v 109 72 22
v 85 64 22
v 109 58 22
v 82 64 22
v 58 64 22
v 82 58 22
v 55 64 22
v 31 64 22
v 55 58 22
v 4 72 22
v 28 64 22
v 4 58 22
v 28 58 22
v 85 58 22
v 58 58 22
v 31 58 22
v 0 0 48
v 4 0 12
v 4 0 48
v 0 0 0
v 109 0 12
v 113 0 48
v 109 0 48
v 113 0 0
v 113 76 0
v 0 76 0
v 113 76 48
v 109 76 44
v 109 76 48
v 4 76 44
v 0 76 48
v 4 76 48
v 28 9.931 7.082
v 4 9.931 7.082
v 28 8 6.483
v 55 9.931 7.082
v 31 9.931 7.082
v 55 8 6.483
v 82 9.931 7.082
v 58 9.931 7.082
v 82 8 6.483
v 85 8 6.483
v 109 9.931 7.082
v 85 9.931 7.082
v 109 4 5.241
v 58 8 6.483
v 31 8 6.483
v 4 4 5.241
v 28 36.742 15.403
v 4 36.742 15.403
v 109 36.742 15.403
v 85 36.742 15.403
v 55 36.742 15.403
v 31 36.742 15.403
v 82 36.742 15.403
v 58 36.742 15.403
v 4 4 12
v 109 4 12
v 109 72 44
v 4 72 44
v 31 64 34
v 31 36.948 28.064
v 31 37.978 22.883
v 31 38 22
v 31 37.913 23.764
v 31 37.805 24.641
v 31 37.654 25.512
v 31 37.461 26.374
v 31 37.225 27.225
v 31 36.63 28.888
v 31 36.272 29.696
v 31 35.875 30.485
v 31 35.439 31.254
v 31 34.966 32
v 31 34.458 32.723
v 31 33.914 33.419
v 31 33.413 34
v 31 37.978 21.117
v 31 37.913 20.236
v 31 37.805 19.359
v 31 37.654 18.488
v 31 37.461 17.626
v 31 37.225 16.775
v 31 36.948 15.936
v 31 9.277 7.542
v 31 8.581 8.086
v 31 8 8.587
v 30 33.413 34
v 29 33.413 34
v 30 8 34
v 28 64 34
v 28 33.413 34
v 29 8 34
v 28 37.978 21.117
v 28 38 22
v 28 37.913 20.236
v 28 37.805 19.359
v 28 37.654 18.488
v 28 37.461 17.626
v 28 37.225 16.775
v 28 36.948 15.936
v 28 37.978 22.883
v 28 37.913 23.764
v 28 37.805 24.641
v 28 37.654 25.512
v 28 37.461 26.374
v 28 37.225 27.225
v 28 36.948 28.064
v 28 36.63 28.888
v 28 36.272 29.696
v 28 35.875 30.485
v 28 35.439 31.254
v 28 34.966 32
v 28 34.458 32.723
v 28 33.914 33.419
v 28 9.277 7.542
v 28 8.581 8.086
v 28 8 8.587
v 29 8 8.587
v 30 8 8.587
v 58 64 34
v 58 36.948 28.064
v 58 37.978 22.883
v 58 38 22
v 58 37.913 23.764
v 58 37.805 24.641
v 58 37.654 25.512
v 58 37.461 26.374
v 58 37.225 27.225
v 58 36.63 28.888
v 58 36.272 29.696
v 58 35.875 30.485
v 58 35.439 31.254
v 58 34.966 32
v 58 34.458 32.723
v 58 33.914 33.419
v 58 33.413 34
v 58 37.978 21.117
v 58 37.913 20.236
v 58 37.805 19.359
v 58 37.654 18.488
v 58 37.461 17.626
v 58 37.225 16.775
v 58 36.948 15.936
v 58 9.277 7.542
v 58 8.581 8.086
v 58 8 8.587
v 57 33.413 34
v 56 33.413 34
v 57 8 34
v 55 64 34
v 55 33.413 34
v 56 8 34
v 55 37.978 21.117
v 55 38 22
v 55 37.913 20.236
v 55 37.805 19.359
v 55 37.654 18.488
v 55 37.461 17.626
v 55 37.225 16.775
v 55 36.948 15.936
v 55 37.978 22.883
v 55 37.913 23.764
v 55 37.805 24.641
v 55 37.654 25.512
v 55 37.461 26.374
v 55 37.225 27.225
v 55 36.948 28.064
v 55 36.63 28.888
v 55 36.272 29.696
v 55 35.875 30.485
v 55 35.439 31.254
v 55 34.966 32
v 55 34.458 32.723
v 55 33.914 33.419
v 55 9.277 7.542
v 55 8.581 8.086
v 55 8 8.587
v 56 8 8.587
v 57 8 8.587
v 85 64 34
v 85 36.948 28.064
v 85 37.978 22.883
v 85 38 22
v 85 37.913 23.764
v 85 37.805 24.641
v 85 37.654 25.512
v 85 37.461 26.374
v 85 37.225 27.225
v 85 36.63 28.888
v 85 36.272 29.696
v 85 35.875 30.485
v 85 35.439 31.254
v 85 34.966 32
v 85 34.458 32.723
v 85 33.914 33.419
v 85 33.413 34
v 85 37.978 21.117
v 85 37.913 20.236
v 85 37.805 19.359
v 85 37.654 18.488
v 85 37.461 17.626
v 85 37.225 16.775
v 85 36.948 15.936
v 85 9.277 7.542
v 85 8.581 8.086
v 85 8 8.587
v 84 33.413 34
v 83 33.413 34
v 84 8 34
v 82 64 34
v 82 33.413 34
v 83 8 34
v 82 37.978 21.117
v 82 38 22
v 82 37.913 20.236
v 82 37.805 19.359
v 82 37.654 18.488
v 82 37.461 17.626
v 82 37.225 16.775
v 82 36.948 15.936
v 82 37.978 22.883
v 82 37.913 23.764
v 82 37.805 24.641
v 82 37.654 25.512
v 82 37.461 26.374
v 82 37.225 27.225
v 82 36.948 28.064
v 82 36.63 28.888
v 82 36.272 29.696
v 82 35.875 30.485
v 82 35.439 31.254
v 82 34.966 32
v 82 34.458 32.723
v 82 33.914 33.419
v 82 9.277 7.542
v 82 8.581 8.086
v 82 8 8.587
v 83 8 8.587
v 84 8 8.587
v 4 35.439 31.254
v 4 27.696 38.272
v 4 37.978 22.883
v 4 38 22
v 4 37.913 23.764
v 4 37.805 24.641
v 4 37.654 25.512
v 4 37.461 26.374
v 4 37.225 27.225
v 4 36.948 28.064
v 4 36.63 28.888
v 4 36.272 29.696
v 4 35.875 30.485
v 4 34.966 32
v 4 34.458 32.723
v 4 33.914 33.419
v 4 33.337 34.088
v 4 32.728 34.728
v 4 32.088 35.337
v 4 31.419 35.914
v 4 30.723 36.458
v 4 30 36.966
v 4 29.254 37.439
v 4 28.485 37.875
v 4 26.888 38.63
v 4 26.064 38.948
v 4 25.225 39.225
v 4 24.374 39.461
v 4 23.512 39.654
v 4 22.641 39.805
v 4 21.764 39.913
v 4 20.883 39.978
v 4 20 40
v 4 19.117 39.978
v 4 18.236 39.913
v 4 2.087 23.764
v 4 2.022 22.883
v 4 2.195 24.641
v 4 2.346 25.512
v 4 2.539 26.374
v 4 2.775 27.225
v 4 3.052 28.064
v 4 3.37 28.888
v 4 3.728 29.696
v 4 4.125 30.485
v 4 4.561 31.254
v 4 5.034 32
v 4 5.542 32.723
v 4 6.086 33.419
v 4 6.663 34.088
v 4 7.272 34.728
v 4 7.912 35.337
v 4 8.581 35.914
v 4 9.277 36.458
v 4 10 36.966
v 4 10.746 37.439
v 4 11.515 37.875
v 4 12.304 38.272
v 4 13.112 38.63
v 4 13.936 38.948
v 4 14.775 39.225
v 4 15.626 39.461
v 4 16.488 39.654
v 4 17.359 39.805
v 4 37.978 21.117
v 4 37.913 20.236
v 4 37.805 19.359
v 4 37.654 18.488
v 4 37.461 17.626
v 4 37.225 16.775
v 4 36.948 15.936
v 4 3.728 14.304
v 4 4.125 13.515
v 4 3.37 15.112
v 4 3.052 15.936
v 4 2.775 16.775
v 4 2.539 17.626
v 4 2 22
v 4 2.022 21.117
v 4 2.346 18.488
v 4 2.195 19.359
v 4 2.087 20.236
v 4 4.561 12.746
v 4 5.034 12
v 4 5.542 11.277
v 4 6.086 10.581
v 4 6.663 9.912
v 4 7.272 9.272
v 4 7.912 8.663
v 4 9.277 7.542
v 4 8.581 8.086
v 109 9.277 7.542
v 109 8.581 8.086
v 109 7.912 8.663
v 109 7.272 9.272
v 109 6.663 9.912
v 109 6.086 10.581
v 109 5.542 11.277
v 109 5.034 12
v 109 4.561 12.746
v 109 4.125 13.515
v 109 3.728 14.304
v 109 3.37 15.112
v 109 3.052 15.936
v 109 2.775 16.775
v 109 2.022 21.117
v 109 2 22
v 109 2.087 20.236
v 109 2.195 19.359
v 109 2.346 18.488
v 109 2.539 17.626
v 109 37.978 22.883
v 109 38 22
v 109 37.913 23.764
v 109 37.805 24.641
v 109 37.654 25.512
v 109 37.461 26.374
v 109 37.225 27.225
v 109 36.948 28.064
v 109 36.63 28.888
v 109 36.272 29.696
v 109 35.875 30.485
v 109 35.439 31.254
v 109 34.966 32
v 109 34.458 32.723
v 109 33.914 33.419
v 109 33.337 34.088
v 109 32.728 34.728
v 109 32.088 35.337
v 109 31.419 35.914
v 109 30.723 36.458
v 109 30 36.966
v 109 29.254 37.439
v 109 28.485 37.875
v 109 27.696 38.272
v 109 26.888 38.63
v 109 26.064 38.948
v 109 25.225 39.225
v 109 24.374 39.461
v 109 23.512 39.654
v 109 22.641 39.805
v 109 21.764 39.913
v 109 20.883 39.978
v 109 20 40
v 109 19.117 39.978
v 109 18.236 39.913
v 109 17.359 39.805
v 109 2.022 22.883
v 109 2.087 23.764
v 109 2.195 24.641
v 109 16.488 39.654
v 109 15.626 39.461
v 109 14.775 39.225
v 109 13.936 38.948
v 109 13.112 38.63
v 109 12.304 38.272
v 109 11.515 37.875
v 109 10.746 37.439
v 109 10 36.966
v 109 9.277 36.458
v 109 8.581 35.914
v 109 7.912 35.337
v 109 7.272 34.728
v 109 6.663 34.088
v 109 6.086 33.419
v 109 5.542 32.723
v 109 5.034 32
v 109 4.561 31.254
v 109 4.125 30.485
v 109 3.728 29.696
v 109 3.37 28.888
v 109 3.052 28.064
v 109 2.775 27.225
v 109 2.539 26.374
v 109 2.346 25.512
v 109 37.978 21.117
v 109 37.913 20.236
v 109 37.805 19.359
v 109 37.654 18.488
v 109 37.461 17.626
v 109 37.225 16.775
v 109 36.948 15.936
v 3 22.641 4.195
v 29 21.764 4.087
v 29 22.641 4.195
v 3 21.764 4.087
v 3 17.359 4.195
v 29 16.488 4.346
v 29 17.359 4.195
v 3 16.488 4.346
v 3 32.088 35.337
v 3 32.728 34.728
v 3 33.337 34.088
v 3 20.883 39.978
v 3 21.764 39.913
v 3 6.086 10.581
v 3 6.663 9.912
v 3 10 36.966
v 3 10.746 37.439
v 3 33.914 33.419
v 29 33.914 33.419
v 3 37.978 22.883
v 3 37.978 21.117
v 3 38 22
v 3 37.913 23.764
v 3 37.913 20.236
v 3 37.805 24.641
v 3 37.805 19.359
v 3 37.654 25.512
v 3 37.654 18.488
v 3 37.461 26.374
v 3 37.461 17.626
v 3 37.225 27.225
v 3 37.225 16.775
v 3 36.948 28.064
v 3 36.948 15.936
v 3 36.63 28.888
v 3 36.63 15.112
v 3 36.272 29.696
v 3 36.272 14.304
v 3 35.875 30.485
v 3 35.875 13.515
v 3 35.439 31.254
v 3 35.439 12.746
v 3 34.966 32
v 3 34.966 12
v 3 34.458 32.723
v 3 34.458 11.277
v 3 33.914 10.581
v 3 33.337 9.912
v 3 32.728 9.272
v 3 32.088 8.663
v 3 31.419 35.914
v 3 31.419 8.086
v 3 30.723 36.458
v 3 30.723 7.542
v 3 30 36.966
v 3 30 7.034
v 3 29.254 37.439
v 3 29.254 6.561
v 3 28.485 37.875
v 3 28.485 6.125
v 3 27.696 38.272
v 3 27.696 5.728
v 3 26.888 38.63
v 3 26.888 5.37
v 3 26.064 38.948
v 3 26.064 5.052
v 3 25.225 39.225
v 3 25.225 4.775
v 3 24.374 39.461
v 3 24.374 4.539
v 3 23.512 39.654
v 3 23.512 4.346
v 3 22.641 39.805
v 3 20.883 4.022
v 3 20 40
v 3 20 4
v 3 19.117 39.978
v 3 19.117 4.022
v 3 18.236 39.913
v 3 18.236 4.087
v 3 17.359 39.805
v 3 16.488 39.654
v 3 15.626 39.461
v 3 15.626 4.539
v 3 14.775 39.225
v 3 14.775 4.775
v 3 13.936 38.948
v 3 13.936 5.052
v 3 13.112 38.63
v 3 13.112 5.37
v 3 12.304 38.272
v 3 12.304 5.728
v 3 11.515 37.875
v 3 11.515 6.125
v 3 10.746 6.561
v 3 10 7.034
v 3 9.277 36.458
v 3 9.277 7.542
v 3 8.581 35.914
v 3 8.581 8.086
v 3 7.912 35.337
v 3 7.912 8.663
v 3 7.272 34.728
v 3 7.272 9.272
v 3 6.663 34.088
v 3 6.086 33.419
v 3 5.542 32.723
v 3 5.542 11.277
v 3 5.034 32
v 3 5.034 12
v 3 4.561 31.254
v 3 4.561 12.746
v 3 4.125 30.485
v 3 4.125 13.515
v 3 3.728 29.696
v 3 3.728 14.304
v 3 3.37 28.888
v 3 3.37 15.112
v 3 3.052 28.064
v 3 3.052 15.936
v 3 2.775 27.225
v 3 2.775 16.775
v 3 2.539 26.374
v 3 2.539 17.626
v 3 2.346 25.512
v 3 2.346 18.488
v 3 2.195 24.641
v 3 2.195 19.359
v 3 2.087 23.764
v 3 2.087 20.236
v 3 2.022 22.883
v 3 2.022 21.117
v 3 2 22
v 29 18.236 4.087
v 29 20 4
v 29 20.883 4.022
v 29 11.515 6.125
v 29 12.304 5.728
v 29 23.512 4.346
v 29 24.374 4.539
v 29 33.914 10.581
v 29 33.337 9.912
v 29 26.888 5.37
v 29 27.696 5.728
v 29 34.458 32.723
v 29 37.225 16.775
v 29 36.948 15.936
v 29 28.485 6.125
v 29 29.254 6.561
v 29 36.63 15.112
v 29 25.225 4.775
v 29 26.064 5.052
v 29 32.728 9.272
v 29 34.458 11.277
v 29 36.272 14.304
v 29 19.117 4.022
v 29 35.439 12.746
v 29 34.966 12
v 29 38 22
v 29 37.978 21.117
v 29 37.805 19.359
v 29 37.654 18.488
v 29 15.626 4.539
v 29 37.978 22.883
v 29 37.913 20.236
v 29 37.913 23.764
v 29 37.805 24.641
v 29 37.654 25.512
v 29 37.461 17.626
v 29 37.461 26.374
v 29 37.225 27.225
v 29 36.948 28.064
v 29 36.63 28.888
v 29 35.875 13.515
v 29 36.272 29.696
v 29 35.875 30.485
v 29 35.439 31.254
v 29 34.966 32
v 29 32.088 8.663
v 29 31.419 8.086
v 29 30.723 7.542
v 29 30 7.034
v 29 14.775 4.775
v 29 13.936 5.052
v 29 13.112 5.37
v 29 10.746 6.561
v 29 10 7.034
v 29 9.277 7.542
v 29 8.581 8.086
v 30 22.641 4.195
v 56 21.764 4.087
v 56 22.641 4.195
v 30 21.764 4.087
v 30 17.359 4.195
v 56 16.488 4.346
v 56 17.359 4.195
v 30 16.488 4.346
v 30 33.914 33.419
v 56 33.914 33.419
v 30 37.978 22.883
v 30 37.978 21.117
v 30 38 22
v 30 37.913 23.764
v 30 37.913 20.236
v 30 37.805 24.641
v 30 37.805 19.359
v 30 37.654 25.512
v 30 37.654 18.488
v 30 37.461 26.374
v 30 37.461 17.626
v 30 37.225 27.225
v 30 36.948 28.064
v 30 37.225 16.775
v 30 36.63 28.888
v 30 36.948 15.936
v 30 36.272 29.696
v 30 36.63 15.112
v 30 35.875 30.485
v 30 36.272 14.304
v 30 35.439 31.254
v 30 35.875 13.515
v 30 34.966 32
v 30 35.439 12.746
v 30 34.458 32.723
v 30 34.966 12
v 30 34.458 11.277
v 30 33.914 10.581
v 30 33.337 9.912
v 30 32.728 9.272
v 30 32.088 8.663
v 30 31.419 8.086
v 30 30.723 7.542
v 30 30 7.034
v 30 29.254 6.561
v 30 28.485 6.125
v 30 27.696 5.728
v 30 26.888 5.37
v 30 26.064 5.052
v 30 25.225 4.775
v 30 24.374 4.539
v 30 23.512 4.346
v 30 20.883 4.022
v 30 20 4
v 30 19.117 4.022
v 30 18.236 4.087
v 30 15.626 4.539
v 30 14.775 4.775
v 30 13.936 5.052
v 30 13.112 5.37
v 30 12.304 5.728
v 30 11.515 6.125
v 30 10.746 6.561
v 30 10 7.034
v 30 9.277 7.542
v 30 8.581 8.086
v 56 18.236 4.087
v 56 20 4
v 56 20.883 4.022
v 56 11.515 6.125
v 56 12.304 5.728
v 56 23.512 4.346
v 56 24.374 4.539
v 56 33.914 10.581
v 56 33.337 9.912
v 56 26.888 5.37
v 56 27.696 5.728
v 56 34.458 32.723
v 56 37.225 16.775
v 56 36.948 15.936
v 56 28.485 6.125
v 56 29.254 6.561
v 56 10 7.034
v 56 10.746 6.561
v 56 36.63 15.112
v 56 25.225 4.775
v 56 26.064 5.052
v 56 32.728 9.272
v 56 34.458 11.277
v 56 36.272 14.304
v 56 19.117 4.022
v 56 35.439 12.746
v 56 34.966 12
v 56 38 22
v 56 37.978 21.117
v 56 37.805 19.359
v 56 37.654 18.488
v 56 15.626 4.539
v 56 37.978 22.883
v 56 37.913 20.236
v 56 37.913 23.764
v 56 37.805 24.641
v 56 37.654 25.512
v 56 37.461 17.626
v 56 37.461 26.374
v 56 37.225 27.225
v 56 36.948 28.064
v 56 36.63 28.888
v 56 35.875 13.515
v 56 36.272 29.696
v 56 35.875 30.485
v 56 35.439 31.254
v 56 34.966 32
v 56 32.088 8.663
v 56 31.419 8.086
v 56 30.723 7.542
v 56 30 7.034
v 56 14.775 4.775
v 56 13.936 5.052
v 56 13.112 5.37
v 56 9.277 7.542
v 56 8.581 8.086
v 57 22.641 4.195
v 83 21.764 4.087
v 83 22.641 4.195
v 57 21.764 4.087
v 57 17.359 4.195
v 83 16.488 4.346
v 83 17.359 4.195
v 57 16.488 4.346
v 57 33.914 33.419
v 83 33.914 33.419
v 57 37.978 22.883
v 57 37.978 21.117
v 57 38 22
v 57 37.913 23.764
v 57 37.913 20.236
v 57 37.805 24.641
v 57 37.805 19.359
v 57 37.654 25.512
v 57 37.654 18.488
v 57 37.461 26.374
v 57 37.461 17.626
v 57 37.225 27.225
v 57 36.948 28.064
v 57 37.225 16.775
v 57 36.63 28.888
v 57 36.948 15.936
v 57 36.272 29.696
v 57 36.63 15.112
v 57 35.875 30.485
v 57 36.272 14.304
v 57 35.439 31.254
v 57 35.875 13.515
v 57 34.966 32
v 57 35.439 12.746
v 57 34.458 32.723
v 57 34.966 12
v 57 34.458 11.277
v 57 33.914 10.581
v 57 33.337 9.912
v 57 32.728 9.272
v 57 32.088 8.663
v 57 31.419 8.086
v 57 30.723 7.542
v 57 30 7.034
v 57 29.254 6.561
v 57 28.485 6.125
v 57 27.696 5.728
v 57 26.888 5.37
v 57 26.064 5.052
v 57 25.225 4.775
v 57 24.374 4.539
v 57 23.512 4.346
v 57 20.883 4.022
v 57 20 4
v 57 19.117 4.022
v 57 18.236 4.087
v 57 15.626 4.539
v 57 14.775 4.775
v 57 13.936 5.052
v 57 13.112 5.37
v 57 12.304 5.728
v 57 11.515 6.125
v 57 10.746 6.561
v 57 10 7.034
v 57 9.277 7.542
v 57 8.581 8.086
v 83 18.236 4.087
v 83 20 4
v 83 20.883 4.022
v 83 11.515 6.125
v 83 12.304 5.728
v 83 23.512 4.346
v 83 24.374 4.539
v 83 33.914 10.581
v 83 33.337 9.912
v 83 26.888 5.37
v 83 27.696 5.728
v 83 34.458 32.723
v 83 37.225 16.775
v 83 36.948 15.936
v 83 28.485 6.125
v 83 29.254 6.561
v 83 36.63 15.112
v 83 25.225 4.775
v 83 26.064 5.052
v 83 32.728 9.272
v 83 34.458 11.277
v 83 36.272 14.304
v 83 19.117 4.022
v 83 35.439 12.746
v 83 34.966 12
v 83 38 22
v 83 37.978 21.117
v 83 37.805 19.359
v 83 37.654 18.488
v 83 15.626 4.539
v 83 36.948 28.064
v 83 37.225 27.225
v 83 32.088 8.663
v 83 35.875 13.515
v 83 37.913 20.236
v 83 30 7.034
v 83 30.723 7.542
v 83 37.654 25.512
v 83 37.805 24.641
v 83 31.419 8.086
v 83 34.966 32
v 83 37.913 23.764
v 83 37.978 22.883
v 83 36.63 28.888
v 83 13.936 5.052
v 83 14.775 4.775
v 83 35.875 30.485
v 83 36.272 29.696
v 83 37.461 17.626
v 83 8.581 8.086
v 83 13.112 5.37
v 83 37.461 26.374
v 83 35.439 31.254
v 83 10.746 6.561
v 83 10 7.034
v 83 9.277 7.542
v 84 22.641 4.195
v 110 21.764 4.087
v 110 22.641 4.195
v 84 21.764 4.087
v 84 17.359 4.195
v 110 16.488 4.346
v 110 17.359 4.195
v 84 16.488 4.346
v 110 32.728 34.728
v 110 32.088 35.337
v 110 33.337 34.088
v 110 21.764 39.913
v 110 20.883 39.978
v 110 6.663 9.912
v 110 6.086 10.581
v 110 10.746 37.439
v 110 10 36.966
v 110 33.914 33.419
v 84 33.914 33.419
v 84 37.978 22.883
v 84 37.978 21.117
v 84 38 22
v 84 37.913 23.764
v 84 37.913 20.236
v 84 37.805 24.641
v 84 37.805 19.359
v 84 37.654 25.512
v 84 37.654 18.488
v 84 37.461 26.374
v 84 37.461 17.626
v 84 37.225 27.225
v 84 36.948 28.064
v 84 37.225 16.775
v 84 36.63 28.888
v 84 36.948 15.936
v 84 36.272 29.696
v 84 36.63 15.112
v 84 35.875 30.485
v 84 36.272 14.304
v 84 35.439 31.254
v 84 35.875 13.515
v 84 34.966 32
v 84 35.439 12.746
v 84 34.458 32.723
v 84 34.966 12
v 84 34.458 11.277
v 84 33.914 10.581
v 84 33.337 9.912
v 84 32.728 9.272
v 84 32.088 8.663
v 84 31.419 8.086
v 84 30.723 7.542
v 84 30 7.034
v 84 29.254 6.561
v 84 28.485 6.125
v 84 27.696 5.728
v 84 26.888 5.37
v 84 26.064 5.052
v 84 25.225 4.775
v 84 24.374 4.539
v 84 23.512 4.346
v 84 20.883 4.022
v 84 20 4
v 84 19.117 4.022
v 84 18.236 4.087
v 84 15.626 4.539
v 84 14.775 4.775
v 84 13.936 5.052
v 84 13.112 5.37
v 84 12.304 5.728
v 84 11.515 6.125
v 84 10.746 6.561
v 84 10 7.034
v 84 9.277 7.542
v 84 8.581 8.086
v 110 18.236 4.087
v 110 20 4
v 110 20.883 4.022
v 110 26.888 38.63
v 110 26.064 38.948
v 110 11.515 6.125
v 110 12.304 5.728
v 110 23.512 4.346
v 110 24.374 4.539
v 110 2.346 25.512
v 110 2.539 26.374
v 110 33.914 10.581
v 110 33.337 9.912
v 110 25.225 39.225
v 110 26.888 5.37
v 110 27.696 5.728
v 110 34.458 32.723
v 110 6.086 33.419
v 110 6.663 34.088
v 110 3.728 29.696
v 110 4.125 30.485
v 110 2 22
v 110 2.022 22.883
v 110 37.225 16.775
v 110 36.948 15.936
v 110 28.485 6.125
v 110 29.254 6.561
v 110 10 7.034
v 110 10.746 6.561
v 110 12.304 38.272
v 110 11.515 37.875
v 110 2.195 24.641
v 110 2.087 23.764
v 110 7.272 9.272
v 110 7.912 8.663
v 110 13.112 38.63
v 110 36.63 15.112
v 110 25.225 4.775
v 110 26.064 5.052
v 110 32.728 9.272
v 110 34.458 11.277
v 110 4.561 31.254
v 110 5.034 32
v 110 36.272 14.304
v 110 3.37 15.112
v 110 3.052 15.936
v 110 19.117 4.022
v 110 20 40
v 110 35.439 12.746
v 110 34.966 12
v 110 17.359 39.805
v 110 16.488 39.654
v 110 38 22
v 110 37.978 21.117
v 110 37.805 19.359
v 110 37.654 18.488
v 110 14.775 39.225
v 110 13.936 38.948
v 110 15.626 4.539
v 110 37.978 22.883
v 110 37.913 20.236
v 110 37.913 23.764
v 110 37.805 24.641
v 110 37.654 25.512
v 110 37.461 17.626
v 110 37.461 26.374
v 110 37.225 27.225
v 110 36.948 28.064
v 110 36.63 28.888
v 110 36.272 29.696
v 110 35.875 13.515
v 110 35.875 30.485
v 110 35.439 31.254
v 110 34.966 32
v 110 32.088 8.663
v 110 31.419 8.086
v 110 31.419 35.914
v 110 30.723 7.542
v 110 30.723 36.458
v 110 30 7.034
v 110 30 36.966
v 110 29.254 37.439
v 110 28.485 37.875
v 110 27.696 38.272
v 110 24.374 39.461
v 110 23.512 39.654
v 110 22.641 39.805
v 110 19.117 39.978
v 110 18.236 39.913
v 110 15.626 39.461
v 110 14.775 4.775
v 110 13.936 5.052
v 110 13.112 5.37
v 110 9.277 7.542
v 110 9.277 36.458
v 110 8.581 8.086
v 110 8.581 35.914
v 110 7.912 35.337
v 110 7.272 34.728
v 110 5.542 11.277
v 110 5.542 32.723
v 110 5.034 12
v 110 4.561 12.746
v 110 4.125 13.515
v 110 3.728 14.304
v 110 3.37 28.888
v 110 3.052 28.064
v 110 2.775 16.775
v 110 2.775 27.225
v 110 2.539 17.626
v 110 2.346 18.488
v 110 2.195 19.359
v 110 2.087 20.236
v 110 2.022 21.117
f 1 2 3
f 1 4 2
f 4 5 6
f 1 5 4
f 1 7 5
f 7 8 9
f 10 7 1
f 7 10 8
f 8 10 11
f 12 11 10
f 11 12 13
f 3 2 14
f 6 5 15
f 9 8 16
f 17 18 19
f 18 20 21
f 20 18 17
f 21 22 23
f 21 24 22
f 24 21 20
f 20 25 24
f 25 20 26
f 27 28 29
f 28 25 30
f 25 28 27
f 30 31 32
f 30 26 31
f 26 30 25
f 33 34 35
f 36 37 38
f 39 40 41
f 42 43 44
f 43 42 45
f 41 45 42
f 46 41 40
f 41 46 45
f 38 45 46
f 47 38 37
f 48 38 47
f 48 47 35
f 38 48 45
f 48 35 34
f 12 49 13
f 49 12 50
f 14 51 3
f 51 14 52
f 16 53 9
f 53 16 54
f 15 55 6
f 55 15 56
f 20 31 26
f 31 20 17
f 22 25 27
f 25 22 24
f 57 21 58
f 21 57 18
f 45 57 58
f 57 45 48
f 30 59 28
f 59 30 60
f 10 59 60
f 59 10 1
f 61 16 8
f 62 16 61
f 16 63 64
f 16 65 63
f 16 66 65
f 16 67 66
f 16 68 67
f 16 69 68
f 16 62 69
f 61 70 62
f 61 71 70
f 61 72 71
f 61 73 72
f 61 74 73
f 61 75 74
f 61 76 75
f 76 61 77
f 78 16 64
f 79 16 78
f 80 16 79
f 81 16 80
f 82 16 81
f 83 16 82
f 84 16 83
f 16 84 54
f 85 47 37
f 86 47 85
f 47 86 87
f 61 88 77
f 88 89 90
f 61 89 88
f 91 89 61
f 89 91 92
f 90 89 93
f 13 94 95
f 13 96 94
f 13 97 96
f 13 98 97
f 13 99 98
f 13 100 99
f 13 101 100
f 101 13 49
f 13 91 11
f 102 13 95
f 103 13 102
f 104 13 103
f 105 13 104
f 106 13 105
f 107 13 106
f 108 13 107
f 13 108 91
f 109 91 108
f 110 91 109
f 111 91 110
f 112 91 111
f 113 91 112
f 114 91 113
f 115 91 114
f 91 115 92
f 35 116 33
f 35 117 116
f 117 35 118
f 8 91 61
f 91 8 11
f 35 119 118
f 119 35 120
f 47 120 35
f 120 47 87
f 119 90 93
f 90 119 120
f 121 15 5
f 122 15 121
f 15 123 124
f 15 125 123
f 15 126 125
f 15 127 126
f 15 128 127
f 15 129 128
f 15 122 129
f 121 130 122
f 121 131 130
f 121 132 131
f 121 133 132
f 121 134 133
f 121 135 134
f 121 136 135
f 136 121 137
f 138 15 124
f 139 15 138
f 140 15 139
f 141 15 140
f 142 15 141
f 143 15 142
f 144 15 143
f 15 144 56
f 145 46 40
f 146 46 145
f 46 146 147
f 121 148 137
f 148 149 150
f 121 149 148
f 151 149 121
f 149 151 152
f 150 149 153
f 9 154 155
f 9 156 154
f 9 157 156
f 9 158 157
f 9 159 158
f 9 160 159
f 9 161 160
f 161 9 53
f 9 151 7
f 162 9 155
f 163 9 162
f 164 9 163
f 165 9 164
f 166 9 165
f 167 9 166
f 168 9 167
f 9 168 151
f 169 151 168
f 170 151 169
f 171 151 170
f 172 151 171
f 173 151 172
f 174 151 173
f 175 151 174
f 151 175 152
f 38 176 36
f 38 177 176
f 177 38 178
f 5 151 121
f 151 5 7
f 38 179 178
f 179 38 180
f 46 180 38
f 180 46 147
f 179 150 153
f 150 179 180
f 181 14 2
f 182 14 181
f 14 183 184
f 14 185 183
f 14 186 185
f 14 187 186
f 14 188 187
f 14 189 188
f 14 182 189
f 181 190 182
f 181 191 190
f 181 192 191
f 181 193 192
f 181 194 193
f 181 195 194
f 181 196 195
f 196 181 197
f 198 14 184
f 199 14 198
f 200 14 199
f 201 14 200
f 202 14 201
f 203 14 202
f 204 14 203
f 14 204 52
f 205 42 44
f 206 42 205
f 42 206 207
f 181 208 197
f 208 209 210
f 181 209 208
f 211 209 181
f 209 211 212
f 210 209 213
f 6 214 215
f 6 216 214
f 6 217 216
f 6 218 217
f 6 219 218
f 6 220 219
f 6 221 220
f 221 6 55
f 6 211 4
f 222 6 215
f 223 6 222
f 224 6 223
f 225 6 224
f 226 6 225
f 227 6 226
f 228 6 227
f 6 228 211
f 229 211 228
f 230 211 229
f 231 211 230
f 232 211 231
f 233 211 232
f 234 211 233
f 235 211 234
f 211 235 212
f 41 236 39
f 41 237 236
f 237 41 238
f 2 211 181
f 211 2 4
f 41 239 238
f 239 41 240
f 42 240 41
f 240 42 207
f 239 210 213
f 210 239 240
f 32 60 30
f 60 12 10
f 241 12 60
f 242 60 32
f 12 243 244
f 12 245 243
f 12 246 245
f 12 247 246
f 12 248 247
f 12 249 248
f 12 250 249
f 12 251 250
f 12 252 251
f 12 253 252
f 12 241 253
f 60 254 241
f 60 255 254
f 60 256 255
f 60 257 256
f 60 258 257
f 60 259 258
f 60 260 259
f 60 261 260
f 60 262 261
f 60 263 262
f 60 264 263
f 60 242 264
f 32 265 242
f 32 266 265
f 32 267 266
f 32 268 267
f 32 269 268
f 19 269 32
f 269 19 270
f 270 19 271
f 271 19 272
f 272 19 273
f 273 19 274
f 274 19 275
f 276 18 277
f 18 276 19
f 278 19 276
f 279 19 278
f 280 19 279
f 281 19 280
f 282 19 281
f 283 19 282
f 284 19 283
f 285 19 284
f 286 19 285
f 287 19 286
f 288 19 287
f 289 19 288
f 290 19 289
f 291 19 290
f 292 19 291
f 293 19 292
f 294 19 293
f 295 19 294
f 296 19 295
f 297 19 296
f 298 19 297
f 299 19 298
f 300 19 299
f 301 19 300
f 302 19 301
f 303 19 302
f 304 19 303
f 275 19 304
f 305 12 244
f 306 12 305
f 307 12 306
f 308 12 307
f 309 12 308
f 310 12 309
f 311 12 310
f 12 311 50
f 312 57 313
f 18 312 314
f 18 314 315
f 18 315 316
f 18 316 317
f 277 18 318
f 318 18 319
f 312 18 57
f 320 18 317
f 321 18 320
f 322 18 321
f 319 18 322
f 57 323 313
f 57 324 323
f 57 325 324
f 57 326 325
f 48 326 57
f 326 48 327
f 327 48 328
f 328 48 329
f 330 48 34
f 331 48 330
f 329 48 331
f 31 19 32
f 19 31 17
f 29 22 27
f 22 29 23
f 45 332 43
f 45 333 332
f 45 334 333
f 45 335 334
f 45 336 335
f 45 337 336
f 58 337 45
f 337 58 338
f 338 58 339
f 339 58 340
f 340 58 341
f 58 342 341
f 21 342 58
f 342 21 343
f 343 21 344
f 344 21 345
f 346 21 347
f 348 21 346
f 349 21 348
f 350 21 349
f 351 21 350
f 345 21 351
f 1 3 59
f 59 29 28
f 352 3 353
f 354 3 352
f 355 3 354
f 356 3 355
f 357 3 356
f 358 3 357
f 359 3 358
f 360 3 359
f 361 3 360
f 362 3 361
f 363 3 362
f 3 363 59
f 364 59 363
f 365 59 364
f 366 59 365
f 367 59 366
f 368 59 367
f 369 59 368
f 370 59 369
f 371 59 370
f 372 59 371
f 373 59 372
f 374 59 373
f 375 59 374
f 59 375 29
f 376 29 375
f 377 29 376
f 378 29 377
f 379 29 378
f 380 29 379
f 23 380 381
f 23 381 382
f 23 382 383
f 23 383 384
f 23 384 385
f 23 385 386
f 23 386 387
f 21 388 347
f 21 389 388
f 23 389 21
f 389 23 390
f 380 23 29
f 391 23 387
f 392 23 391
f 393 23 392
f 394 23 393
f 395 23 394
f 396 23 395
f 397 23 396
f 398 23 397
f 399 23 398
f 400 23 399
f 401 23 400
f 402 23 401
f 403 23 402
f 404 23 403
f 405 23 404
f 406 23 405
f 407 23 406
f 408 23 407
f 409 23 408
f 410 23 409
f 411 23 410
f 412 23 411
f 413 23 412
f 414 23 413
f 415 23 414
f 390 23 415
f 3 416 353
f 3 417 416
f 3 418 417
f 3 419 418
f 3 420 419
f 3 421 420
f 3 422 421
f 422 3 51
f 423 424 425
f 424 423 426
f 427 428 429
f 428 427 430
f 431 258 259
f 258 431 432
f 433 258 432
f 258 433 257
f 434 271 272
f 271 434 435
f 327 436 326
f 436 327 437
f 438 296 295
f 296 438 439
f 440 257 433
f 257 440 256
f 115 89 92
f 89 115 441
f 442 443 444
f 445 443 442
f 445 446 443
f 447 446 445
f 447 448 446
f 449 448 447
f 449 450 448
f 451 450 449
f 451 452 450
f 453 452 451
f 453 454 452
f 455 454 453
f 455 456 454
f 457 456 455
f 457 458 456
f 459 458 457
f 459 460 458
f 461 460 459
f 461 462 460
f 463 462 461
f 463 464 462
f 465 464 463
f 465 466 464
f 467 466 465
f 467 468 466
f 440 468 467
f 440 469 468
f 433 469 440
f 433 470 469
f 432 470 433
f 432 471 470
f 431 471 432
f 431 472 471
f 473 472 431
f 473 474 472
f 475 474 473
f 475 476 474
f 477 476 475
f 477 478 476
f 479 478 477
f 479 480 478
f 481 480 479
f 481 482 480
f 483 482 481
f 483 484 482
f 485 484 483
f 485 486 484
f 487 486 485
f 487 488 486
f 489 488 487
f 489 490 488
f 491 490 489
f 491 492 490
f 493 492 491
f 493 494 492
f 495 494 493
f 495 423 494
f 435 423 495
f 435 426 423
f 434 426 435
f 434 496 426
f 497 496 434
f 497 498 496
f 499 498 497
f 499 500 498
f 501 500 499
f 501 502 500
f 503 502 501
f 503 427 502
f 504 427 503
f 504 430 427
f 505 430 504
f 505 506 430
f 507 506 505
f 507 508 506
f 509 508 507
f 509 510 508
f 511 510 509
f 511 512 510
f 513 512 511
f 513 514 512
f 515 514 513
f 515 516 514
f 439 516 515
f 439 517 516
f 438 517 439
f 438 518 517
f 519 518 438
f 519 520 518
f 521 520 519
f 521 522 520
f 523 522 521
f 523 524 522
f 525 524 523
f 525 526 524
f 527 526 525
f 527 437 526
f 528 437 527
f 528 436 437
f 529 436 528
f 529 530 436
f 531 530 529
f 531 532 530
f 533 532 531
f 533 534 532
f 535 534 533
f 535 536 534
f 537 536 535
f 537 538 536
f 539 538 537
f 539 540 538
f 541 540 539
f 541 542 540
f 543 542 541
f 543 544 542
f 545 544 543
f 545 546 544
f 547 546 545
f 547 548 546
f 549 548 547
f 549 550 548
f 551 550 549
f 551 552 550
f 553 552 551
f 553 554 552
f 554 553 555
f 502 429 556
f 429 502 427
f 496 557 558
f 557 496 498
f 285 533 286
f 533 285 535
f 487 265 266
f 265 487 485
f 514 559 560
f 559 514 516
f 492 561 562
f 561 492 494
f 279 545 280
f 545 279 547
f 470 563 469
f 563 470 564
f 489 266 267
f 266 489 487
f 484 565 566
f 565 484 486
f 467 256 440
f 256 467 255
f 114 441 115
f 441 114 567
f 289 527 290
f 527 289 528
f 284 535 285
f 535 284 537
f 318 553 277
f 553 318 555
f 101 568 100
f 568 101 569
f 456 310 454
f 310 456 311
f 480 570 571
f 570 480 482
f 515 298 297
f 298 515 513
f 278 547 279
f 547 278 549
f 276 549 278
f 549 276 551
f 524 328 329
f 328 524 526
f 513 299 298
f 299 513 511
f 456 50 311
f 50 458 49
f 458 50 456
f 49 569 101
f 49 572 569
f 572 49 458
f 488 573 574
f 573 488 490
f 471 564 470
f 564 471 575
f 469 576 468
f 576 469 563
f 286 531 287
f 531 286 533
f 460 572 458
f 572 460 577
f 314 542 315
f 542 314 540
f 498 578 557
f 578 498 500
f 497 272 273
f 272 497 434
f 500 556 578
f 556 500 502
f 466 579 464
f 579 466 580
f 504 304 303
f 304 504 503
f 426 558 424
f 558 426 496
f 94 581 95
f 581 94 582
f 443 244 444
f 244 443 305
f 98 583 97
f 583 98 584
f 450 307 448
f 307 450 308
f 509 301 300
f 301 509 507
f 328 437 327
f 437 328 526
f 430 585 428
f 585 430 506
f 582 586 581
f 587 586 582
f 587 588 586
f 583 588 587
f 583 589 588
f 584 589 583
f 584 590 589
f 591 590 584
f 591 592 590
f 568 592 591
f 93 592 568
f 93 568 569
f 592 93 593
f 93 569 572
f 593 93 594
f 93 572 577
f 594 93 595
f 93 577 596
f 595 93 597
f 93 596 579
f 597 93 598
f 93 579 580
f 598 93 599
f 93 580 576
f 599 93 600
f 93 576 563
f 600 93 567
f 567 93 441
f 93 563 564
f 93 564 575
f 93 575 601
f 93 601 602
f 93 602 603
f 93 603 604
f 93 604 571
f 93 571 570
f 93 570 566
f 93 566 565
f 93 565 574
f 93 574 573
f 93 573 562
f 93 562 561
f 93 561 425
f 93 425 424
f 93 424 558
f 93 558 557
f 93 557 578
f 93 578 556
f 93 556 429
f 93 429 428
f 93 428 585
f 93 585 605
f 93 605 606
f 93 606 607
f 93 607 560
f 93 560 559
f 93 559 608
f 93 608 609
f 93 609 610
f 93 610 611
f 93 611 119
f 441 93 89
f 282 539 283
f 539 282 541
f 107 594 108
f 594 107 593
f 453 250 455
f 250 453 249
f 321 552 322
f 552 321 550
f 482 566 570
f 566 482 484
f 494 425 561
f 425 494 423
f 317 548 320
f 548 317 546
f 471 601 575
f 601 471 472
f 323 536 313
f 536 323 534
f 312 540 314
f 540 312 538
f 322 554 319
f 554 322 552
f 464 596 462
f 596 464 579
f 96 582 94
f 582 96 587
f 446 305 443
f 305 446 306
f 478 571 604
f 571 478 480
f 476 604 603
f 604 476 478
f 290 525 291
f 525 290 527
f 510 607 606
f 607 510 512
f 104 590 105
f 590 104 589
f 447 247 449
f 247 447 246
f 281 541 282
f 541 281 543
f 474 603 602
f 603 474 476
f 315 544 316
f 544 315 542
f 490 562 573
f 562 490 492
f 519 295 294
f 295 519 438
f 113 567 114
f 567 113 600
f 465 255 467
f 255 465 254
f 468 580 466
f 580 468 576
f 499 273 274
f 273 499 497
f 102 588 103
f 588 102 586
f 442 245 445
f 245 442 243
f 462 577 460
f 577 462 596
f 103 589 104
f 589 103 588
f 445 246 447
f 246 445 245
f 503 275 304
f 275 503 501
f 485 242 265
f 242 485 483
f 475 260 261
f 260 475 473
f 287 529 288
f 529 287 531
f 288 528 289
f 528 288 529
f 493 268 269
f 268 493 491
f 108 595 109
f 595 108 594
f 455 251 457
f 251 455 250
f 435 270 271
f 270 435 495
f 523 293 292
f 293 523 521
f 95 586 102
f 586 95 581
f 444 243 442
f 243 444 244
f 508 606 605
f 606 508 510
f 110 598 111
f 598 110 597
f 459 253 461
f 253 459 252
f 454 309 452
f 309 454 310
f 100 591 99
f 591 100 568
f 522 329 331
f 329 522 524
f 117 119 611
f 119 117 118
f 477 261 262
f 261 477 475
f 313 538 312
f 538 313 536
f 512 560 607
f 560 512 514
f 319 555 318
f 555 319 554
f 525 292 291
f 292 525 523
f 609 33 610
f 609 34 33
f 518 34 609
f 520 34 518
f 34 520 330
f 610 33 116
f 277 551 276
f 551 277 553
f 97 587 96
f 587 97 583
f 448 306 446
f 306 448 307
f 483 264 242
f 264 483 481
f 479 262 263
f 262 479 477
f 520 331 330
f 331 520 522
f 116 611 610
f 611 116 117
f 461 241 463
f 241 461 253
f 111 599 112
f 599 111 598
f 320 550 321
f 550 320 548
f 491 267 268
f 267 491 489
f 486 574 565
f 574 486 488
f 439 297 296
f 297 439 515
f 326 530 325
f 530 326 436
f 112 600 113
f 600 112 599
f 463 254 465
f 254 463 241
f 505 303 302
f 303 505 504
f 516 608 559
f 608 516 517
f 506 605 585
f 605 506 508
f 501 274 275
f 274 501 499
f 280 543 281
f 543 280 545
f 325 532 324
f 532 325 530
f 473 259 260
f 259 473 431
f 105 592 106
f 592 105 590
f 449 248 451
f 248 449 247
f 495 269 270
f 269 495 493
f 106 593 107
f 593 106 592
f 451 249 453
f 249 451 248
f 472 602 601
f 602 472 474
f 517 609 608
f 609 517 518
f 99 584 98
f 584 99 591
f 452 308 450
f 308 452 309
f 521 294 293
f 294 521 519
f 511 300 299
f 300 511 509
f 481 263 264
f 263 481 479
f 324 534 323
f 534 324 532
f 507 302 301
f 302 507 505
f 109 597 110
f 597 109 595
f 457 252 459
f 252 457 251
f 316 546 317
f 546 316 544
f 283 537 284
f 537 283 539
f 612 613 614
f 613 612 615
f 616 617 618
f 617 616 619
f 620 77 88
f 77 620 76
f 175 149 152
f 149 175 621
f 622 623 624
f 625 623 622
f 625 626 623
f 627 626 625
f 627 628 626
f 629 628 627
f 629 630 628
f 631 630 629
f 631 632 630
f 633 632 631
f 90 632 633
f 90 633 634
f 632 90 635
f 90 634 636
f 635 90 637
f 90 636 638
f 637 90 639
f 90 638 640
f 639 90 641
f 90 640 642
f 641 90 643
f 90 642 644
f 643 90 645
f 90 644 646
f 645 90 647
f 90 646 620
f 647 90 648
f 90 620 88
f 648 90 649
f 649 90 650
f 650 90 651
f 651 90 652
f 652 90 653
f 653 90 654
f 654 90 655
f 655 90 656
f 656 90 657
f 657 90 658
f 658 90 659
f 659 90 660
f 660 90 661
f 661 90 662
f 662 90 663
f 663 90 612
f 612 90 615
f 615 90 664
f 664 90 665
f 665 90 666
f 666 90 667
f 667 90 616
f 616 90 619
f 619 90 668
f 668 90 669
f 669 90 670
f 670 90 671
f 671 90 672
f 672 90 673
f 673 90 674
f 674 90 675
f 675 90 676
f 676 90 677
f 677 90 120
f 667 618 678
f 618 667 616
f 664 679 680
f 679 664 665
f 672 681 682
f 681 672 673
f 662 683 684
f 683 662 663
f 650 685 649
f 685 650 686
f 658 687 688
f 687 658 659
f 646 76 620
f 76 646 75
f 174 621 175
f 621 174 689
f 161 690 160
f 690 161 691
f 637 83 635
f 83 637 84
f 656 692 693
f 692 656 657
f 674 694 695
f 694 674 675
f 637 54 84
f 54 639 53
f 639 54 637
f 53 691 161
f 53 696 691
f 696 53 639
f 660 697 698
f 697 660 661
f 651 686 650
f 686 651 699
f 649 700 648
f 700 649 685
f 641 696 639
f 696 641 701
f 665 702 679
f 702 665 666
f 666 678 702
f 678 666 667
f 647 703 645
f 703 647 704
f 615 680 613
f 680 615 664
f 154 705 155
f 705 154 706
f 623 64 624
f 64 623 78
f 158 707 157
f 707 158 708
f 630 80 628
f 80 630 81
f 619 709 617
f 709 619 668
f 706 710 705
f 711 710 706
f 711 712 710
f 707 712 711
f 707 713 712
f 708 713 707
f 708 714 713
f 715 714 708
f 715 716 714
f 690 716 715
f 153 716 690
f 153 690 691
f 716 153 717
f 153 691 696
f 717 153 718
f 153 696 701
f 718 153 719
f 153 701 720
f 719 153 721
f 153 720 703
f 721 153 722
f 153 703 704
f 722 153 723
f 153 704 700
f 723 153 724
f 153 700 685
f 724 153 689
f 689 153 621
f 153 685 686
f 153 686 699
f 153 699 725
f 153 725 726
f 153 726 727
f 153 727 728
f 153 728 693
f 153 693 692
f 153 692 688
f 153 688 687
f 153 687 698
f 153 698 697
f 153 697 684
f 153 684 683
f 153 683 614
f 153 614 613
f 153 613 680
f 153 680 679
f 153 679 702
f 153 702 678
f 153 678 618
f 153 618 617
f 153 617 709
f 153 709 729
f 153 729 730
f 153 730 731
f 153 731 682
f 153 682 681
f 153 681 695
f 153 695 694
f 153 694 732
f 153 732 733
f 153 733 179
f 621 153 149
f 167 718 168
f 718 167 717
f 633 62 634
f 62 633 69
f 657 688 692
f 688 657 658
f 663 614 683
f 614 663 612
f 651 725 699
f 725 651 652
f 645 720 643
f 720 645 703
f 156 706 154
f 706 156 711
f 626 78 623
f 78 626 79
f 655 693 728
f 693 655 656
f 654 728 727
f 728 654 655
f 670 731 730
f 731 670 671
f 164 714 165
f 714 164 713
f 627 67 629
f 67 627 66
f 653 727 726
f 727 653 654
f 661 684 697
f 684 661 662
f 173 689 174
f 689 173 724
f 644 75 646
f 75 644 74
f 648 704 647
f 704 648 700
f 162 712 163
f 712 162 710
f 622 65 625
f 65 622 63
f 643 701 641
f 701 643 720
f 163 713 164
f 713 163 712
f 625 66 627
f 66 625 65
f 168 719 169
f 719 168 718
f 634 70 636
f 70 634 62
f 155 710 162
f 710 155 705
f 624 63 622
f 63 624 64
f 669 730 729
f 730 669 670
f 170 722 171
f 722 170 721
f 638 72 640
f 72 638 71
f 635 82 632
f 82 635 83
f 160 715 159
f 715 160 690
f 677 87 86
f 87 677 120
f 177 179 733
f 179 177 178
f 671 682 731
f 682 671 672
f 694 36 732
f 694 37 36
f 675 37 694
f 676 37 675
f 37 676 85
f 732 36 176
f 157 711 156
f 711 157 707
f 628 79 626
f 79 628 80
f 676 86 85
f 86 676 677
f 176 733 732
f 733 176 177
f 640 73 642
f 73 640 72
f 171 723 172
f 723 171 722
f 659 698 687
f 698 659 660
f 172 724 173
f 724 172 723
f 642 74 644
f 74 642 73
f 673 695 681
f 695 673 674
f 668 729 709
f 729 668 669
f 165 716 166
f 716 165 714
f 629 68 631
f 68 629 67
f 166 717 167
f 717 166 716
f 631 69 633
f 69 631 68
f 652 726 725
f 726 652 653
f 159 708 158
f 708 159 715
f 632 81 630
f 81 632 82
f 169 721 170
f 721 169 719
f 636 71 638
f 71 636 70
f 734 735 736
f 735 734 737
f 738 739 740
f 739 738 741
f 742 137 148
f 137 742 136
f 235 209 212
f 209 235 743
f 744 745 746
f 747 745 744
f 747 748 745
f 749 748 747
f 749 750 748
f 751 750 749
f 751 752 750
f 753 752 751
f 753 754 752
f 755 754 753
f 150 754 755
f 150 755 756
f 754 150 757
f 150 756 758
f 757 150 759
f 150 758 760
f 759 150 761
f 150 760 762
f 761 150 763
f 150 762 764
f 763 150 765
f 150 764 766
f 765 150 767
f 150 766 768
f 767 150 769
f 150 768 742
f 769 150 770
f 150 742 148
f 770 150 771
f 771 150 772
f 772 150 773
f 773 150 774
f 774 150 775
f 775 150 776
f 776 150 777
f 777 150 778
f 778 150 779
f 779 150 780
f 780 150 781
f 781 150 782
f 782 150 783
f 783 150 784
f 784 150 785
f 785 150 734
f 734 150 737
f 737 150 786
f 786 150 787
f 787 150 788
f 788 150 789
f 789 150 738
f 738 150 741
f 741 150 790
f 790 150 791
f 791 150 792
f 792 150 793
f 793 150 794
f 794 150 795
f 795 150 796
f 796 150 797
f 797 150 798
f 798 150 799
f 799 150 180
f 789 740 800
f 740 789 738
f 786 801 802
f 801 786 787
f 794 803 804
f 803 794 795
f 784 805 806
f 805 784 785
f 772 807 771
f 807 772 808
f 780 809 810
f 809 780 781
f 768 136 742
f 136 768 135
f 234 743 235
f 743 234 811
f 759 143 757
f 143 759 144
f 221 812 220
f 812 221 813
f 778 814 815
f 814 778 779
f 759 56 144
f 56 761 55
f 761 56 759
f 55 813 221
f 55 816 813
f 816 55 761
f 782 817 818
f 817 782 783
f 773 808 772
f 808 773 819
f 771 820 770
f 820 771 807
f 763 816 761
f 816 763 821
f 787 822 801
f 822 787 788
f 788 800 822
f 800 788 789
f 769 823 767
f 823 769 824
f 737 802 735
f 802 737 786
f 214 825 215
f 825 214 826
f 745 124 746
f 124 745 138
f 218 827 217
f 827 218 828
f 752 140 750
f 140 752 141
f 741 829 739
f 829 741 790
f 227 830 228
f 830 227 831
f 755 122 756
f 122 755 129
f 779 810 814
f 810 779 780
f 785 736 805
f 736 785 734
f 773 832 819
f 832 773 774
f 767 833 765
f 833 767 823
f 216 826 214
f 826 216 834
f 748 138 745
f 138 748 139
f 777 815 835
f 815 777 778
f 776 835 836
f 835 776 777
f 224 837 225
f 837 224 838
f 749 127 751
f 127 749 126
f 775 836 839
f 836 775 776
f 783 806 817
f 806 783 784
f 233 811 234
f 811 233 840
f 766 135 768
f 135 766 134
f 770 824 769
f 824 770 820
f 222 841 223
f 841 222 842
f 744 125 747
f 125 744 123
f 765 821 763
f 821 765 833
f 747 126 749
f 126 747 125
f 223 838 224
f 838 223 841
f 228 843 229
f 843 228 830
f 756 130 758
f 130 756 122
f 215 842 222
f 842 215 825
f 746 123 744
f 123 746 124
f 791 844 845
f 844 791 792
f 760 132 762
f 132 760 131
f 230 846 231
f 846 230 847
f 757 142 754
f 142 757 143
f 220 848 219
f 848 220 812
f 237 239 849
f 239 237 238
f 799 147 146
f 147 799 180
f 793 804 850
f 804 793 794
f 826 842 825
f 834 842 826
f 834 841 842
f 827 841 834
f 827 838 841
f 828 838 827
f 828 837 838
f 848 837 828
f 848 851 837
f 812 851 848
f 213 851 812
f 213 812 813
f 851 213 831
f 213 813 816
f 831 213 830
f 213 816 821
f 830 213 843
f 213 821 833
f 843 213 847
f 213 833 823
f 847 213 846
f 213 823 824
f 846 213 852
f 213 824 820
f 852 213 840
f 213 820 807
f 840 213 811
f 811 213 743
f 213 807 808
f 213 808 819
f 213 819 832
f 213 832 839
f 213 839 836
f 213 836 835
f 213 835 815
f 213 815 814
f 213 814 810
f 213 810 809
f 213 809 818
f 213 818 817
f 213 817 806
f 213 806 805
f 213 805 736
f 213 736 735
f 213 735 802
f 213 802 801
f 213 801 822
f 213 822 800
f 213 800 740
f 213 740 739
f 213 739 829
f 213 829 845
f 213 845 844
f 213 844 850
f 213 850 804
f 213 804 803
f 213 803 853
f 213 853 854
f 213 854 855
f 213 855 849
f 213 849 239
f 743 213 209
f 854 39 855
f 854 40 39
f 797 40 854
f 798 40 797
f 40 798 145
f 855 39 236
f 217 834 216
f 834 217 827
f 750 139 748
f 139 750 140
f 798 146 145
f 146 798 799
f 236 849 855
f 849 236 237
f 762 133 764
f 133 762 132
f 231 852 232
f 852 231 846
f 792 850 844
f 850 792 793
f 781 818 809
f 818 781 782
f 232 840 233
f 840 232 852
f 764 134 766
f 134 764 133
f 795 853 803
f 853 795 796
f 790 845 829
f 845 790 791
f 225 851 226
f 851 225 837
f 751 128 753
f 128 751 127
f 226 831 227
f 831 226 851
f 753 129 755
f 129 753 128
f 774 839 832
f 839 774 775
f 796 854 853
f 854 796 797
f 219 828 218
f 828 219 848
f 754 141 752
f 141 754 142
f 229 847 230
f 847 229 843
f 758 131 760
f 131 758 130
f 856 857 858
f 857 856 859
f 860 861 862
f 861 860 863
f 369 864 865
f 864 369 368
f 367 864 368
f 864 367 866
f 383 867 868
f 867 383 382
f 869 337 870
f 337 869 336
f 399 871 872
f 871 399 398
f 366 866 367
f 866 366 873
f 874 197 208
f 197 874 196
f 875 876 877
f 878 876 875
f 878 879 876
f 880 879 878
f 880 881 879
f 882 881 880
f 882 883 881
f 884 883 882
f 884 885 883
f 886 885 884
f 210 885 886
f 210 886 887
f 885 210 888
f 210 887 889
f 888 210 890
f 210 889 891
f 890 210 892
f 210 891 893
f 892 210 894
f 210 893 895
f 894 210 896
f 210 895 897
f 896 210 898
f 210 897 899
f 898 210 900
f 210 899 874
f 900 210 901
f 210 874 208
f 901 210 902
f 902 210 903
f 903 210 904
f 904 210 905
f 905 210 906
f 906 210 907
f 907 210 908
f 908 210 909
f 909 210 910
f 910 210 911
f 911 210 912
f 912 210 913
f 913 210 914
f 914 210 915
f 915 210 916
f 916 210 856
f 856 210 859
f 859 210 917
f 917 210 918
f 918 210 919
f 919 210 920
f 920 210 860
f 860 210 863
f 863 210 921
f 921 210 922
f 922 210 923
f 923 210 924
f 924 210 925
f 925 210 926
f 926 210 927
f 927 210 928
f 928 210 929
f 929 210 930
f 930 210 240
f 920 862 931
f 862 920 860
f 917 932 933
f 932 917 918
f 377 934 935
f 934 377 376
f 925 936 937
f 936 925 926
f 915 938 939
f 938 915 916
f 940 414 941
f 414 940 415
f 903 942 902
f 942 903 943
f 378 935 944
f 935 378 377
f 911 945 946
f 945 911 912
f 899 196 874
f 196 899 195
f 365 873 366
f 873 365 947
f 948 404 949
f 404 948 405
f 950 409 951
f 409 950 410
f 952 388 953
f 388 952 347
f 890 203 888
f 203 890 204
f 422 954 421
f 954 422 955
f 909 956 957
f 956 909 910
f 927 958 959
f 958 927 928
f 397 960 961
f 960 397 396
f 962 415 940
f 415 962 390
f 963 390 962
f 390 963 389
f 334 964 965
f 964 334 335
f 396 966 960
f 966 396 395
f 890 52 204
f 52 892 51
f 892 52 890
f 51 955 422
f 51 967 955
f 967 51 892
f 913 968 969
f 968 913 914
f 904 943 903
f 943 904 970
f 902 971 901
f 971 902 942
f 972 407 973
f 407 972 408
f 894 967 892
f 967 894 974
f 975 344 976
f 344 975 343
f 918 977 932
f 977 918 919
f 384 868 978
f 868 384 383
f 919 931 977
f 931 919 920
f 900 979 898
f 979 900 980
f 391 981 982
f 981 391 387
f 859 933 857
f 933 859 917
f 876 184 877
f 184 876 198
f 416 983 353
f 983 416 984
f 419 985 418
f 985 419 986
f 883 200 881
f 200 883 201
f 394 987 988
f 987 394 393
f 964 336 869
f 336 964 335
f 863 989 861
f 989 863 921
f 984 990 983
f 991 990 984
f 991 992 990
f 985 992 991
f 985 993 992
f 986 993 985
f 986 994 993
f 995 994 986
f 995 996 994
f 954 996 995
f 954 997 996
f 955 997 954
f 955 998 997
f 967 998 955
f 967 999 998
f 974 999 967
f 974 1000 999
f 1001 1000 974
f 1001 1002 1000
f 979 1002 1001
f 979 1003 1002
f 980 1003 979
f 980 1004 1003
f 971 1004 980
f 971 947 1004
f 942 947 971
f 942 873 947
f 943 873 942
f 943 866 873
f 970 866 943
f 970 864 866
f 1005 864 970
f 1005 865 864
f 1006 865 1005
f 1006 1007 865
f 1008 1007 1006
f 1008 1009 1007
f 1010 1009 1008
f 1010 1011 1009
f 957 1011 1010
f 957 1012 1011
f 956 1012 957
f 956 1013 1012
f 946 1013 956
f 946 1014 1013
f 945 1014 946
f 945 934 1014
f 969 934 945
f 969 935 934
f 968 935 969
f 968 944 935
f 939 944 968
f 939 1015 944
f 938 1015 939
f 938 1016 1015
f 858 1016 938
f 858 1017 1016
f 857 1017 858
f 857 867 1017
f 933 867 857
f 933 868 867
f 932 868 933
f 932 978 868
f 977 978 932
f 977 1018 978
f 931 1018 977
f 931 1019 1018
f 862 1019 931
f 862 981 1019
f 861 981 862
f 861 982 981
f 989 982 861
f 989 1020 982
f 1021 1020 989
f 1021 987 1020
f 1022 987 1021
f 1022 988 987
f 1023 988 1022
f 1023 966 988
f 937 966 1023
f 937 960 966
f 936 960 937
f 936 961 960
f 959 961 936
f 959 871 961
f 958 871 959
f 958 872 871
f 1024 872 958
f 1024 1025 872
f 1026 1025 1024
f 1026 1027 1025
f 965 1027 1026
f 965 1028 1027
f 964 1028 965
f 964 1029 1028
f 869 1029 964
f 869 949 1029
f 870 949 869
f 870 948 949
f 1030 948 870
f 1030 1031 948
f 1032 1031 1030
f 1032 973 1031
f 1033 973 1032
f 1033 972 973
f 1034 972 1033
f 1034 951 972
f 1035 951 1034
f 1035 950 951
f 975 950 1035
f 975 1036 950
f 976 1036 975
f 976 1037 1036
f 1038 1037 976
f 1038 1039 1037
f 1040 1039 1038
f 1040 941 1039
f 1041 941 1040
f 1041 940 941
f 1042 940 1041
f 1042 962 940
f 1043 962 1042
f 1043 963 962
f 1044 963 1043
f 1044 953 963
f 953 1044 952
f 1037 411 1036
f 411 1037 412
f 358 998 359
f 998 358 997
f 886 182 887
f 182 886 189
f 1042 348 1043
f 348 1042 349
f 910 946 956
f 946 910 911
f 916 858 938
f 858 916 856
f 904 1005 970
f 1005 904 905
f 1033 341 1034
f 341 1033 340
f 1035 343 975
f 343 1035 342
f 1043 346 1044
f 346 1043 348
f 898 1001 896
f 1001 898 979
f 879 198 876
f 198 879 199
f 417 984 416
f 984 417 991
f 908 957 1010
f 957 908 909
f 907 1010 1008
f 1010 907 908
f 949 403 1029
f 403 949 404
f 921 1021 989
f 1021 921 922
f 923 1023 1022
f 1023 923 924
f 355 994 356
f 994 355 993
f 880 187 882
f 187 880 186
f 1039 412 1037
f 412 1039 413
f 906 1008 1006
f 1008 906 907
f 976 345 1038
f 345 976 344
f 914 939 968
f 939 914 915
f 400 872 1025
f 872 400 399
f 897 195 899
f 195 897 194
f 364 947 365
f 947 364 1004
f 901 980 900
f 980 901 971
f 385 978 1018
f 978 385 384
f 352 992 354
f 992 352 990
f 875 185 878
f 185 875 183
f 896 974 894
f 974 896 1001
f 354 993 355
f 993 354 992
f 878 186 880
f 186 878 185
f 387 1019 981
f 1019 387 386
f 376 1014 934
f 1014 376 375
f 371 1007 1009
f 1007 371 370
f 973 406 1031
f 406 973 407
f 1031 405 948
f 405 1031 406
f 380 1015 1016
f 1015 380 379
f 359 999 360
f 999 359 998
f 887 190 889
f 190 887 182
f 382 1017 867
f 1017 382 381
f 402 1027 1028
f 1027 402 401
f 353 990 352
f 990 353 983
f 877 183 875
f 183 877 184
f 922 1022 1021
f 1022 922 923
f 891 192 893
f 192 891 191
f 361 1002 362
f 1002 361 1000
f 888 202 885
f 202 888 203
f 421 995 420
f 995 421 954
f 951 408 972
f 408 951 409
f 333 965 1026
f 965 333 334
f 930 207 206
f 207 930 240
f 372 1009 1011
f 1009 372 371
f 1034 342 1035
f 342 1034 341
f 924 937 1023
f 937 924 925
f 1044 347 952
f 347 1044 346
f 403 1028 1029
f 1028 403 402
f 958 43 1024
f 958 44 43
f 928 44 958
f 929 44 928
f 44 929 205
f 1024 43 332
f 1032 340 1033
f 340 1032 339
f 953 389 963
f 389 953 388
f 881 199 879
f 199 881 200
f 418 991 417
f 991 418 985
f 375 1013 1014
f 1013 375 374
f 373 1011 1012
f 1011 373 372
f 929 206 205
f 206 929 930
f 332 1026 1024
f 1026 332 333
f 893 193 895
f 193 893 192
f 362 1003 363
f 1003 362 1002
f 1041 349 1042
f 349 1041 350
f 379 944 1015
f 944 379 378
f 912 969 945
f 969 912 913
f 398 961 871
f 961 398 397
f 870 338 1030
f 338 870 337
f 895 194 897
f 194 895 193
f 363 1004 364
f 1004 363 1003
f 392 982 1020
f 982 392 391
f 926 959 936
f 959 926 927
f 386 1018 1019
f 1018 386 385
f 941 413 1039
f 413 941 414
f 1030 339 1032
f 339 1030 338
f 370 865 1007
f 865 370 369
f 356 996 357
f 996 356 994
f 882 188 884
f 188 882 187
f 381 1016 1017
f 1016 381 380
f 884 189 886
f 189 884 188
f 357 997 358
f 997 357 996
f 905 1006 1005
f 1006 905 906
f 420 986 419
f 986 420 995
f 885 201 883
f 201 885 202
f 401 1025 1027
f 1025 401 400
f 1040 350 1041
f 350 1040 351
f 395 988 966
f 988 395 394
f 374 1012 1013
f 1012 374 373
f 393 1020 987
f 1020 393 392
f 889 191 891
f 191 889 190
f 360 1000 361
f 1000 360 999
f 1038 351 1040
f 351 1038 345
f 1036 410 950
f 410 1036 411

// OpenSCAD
// file: ../../common/utils.scad
// Common utilities and shared variables
// Include this file at the top of your models:
//   include <../../common/utils.scad>

// ── Units ────────────────────────────────────────────────────────────────────
// All dimensions in millimeters

// ── Print tolerances ─────────────────────────────────────────────────────────
// Gap to add when two parts need to fit together (e.g., peg into a hole)
FIT_CLEARANCE = 0.2;  // mm

// Tolerance for press-fit / tight connections
PRESS_FIT = 0.1;  // mm

// ── Quality settings ─────────────────────────────────────────────────────────
// Override per-model if needed
$fn = $preview ? 32 : 128;  // Circle/sphere resolution

// ── Common layer heights ──────────────────────────────────────────────────────
LAYER_HEIGHT      = 0.2;   // standard
FIRST_LAYER       = 0.3;   // slightly thicker first layer
MIN_WALL          = 0.4;   // single extrusion width (0.4 mm nozzle)
// main file
// Concept 2: leaning cradle tray with low dividers.
// Lids stand on edge and lean back against a rear support wall.
//
// Usage:
//   openscad -o 02-leaning-cradle-tray.stl 02-leaning-cradle-tray.scad

include <../../common/utils.scad>

lid_d = 78;
lid_h = 44;

n_lids = 4;
slot_gap = 24;
divider_t = 3;
side_wall = 4;
base_t = 4;
tray_depth = 76;
rear_band = 18;
rear_rise = 18;
rear_wall_h = 26;
front_lip_h = 12;
divider_h = 30;
cradle_r = 18;
cradle_z = 22;
cradle_y = 20;

total_w = 2 * side_wall + n_lids * slot_gap + (n_lids - 1) * divider_t;

module tray_shell() {
    union() {
        hull() {
            cube([total_w, tray_depth, base_t]);
            translate([0, tray_depth - rear_band, rear_rise])
                cube([total_w, rear_band, base_t]);
        }

        cube([total_w, 4, front_lip_h]);

        translate([0, tray_depth - 4, rear_rise])
            cube([total_w, 4, rear_wall_h]);
    }
}

difference() {
    union() {
        tray_shell();

        for (divider_index = [1 : n_lids - 1]) {
            divider_x = side_wall + divider_index * slot_gap + (divider_index - 1) * divider_t;
            translate([divider_x, 8, base_t])
                cube([divider_t, tray_depth - 20, divider_h]);
        }

        translate([0, 0, base_t])
            cube([side_wall, tray_depth, rear_rise + rear_wall_h]);

        translate([total_w - side_wall, 0, base_t])
            cube([side_wall, tray_depth, rear_rise + rear_wall_h]);
    }

    for (slot_index = [0 : n_lids - 1]) {
        slot_x = side_wall + slot_index * (slot_gap + divider_t);
        translate([slot_x - 1, cradle_y, cradle_z])
            rotate([0, 90, 0])
                cylinder(h = slot_gap + 2, r = cradle_r);
    }
}
